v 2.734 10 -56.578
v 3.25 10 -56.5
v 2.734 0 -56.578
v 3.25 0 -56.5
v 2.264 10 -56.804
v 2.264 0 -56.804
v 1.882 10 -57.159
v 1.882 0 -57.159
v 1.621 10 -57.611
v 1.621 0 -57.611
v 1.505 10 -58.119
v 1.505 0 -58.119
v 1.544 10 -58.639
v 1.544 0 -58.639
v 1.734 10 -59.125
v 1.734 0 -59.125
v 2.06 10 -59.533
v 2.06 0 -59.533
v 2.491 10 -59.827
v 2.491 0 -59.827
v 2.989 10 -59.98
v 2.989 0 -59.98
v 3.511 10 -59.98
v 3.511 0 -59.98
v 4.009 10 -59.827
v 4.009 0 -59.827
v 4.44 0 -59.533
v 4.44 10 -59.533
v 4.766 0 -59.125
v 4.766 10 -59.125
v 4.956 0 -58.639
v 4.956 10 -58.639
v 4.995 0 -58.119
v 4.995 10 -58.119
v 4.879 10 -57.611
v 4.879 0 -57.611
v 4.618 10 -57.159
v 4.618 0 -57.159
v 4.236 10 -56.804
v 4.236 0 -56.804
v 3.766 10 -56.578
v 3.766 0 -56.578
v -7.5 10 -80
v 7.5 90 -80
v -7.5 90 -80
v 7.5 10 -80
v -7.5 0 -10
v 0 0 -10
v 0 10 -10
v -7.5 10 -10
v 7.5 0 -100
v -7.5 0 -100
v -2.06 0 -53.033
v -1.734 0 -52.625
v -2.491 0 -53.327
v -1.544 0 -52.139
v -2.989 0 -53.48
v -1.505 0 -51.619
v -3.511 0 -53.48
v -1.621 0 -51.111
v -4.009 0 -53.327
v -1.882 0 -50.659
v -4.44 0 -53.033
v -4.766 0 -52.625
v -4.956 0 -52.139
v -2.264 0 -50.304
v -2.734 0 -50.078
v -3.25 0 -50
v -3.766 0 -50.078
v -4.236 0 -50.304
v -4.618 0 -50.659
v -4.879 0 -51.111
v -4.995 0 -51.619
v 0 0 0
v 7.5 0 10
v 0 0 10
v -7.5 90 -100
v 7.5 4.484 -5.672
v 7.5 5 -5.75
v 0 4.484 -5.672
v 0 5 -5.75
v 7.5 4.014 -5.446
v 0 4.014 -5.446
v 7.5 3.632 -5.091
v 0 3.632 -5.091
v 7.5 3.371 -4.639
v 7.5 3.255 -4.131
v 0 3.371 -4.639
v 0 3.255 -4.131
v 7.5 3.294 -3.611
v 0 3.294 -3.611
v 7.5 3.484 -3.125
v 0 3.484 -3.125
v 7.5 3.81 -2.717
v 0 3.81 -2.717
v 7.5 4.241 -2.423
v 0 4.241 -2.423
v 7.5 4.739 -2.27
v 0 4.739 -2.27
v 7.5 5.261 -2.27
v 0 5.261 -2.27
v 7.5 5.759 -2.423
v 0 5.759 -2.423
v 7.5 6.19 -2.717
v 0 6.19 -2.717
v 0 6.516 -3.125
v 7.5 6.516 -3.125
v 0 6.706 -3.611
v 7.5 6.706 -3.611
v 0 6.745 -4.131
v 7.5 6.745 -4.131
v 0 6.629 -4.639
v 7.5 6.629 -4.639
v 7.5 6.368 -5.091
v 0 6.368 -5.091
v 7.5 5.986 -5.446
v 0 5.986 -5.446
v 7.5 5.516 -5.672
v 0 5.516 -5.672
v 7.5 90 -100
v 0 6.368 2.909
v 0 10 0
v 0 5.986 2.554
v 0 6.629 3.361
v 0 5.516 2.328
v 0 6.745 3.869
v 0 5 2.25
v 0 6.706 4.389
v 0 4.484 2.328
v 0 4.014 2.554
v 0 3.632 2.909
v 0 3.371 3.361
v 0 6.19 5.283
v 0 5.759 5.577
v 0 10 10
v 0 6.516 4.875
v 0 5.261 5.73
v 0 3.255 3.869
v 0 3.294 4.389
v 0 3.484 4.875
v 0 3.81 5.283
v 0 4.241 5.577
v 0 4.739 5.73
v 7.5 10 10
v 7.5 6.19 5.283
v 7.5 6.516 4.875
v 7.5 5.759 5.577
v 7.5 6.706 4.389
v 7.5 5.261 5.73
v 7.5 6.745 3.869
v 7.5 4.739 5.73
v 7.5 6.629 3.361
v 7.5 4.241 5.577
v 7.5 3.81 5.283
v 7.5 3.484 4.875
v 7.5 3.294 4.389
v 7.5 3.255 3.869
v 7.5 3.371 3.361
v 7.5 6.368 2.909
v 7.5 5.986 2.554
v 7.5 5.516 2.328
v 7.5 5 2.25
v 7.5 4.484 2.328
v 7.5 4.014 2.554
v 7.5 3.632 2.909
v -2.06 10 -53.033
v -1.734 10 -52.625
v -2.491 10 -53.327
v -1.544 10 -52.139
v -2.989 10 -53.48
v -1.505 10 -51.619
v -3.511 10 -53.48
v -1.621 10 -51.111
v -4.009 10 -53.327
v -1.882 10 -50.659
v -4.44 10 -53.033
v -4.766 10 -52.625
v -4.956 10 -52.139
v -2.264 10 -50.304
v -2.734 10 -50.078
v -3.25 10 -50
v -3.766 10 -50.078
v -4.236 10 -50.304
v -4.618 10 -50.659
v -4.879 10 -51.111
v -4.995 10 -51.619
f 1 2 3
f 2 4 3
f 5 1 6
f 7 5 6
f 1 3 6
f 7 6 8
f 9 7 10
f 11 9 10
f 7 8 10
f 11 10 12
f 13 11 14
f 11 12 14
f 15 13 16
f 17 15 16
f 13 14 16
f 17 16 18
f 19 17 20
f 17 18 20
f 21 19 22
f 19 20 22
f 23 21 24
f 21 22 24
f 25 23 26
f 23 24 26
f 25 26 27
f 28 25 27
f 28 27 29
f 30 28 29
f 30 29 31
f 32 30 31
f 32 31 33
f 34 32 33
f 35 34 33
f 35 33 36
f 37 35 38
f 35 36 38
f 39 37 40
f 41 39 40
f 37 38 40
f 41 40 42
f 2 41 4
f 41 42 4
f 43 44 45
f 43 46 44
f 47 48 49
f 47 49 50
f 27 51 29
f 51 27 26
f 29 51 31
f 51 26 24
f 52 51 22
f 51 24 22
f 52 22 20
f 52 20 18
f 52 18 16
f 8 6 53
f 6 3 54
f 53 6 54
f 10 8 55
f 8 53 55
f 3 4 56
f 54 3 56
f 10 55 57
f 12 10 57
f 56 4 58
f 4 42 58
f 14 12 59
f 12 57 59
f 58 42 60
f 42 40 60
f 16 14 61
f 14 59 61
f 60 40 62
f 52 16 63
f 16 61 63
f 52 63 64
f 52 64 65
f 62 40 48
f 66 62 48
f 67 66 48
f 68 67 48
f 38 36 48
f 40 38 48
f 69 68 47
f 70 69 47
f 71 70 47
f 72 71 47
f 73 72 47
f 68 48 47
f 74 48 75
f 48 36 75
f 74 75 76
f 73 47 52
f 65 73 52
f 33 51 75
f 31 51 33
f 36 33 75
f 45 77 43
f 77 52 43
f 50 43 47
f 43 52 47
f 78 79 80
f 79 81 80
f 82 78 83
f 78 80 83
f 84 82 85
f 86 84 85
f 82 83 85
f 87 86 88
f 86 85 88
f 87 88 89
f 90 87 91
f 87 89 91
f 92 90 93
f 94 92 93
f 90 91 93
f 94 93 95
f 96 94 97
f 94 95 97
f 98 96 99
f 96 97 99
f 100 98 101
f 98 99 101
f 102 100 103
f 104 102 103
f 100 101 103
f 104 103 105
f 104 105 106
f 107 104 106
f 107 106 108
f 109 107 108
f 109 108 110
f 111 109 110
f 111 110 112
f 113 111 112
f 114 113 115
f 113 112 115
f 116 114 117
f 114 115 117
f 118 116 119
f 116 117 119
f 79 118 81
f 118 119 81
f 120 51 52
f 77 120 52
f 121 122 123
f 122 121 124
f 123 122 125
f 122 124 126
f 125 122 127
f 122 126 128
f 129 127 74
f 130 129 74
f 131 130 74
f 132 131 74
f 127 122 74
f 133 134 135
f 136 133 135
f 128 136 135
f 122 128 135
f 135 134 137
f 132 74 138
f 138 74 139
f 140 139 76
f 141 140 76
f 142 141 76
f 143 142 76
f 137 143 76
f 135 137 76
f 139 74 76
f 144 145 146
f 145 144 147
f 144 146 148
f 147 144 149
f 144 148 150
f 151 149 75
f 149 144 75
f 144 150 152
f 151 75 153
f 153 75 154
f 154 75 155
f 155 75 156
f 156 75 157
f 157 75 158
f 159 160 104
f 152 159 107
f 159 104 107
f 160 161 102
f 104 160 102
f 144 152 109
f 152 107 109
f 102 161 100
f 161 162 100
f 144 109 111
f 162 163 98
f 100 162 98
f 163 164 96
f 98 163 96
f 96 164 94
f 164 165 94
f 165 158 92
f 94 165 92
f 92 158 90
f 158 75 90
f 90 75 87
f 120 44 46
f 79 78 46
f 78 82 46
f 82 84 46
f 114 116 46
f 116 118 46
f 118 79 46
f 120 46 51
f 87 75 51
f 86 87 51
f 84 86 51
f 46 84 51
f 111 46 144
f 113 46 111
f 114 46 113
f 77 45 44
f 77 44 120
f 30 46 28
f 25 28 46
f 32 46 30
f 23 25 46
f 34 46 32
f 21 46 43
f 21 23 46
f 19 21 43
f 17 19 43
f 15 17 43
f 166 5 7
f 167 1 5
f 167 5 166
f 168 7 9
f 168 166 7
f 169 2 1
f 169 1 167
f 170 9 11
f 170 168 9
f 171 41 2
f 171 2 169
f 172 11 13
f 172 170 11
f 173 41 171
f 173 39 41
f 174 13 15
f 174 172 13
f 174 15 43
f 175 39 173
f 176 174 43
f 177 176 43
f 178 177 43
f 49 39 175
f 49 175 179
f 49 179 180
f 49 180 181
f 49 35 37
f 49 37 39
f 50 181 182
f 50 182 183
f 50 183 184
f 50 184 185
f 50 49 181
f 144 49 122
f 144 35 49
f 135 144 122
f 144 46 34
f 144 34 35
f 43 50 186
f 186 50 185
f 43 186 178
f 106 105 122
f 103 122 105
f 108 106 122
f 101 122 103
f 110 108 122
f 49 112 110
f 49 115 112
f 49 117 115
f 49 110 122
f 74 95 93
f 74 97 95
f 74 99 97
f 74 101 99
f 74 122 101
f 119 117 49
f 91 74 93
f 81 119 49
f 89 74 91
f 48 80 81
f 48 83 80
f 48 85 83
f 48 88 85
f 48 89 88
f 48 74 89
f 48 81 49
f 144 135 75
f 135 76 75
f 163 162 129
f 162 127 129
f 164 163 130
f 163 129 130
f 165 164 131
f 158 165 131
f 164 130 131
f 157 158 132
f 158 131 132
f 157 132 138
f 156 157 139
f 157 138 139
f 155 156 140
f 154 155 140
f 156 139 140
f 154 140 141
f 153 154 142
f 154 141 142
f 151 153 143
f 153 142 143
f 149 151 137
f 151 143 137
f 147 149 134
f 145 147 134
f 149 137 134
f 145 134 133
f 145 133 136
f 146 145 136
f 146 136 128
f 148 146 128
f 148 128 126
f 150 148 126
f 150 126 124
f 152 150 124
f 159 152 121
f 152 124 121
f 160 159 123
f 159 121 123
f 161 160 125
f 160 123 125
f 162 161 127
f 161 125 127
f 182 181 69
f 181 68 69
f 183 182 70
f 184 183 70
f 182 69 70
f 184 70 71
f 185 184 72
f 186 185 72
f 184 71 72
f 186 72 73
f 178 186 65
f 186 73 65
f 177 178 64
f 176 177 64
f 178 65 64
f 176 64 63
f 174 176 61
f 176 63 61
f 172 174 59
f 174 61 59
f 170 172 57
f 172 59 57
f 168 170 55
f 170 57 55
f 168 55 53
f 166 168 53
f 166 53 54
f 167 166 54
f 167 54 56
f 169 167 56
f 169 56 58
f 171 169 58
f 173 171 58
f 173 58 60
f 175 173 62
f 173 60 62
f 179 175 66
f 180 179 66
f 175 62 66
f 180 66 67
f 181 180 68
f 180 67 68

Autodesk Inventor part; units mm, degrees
ref_plane "YZ Plane" through (0, 0, 0) normal (1, 0, 0) x (0, 1, 0)
ref_plane "XZ Plane" through (0, 0, 0) normal (0, 1, 0) x (-1, 0, 0)
ref_plane "XY Plane" through (0, 0, 0) normal (0, 0, 1) x (1, 0, 0)
sketch "Boceto2" plane through (0, 0, 0) normal (0, 1, 0) x (-1, 0, 0)
  line L0 (7.5, 100) -> (-7.5, 100)
  line L1 (-7.5, 100) -> (-7.5, -100)
  line L2 (-7.5, -100) -> (7.5, -100)
  line L3 (7.5, -100) -> (7.5, 100)
  line L4 (7.5, 100) -> (-7.5, -100) construction
  line L5 (-7.5, 100) -> (7.5, -100) construction
  point P0 (0, 0)
  dimension "d7" = 15
  dimension "d8" = 200
extrude "Extrusión1" add sketch "Boceto2" along normal blind 10
sketch "Boceto3" plane through (0, 10, 0) normal (0, 1, 0) x (1, 0, 0)
  circle A0 centre (3.25, 58.25) radius 1.75
  line L0 (5, 50) -> (-5, 50)
  line L1 (-5, 50) -> (-5, 60)
  line L2 (-5, 60) -> (5, 60)
  line L3 (5, 60) -> (5, 50)
  line L4 (5, 50) -> (-5, 60) construction
  line L5 (-5, 50) -> (5, 60) construction
  circle A1 centre (-3.25, 51.75) radius 1.75
  line L6 (7.5, 100) -> (-7.5, 100) projected
  line L7 (-7.5, 0) -> (3.408, 0)
  line L8 (5, -60) -> (5, -50)
  line L9 (-5, -60) -> (5, -60)
  line L10 (5, -50) -> (-5, -50)
  line L11 (-5, -50) -> (-5, -60)
  line L12 (-5, -50) -> (5, -60) construction
  circle A2 centre (-3.25, -51.75) radius 1.75
  line L13 (5, -50) -> (-5, -60) construction
  circle A3 centre (3.25, -58.25) radius 1.75
  line L14 (-7.5, -100) -> (7.5, -100) projected
  point P0 (0, 0)
  point P1 (-5, 55)
  point P2 (0, 100)
  point P3 (-5, -55)
  dimension "d11" = 3.5
  dimension "d12" = 1.75
  dimension "d13" = 1.75
  dimension "d14" = 1.75
  dimension "d15" = 1.75
  dimension "d16" = 10
  dimension "d17" = 10
  dimension "d19" = 40
  dimension "d81" = 40
hole "Agujero1" at (3.25, 10, 58.25) at (-3.25, 10, 51.75) at (3.25, 10, -58.25) at (-3.25, 10, -51.75) direction (0, -1, 0) diameter 3.5 end through all
sketch "Boceto4" plane through (0, 10, 0) normal (0, 1, 0) x (1, 0, 0)
  line L0 (-7.5, 100) -> (-7.5, -100) projected
  line L1 (-7.5, -100) -> (7.5, -100)
  line L2 (7.5, -100) -> (7.5, -80)
  line L3 (7.5, -80) -> (-7.5, -80)
  line L4 (-7.5, -80) -> (-7.5, -100)
  line L5 (-7.5, 0) -> (1.0116, 0)
  line L6 (-7.5, -100) -> (-7.5, 100)
  line L7 (-7.5, 100) -> (7.5, 100)
  line L8 (7.5, 100) -> (7.5, 80)
  line L9 (7.5, 80) -> (-7.5, 80)
  line L10 (-7.5, 80) -> (-7.5, 100)
  point P0 (0, 0)
  point P1 (-7.5, -80)
  point P2 (-7.5, 80)
  dimension "d27" = 15
  dimension "d28" = 20
extrude "Extrusión2" add sketch "Boceto4" along normal blind 80
sketch "Boceto5" plane through (0, 90, 0) normal (0, 1, 0) x (1, 0, 0)
  line L0 (-7.5, -100) -> (7.5, -100) projected
  line L1 (-7.5, -100) -> (49.5, -100)
  line L2 (49.5, -100) -> (49.5, 100)
  line L3 (49.5, 100) -> (-7.5, 100)
  line L4 (-7.5, 100) -> (-7.5, -100)
  line L5 (49.5, -100) -> (-150.5, -100)
  line L6 (-150.5, -100) -> (-150.5, 100)
  line L7 (-150.5, 100) -> (49.5, 100)
  line L8 (49.5, 100) -> (49.5, -100)
  point P0 (0, 0)
  point P1 (-7.5, 100)
  dimension "d31" = 57
  dimension "d32" = 200
  dimension "d75" = 200
extrude "Extrusión3" add sketch "Boceto5" along normal blind 110
sketch "Boceto6" plane through (0, 200, 0) normal (0, 1, 0) x (1, 0, 0)
  line L0 (49.5, 100) -> (7.5, 100) projected
  line L1 (49.5, 100) -> (29.5, 100)
  line L2 (29.5, 100) -> (29.5, 80)
  line L3 (7.5, -100) -> (49.5, -100) projected
  line L4 (28.5, -100) -> (28.5, -80)
  line L5 (-150.5, 100) -> (-150.5, -100) projected
  line L6 (29.5, 80) -> (-150.5, 80)
  line L7 (-150.5, 80) -> (-150.5, -80)
  line L8 (-150.5, -80) -> (29.5, -80)
  line L9 (29.5, -80) -> (29.5, 80)
  line L10 (-150.5, -100) -> (49.5, -100) projected
  point P0 (7.5, 80)
  point P1 (-50.5, -100)
  dimension "d36" = 20
  dimension "d37" = 20
  dimension "d38" = 20
  dimension "d77" = 20
extrude "Extrusión4" cut sketch "Boceto6" against normal blind 90 contours L8 L5 L6 L9
sketch "Boceto7" plane through (-150.5, 90, -100) normal (-1, 0, 0) x (0, 0, 1)
  line L0 (0, 110) -> (20, 110) projected
  line L1 (20, 110) -> (10, 110)
  line L2 (10, 110) -> (10, 20)
  line L3 (10, 20) -> (20, 20)
  line L4 (20, 20) -> (20, 110)
  line L5 (180, 110) -> (180, 20) projected
  line L6 (180, 110) -> (190, 110)
  line L7 (190, 110) -> (190, 20)
  line L8 (190, 20) -> (180, 20)
  line L9 (180, 20) -> (180, 110)
  line L10 (200, 0) -> (200, 110) projected
  line L11 (0, 0) -> (0, 110) projected
  line L12 (0, 110) -> (10, 110)
  line L13 (10, 110) -> (10, 20)
  line L14 (10, 20) -> (0, 20)
  line L15 (0, 20) -> (0, 110)
  line L16 (200, 110) -> (0, 110) projected
  line L17 (200, 110) -> (190, 110)
  line L18 (190, 110) -> (190, 20)
  line L19 (190, 20) -> (200, 20)
  line L20 (200, 20) -> (200, 110)
  point P0 (100, -90)
  dimension "d63" = 10
  dimension "d65" = 10
  dimension "d76" = 10
extrude "Extrusión5" cut sketch "Boceto7" against normal blind 30 contours L0 L4 L3 L2 | L6 L7 L8 L5
sketch "Boceto8" plane through (-7.5, 0, 100) normal (0, 0, 1) x (1, 0, 0)
  line L0 (-113, 110) -> (-113, 200) projected
  line L1 (-113, 200) -> (-113, 110)
  circle A0 centre (-124.75, 183.25) radius 1.75
  line L2 (-123, 175) -> (-133, 175)
  line L3 (-133, 175) -> (-133, 185)
  line L4 (-133, 185) -> (-123, 185)
  line L5 (-123, 185) -> (-123, 175)
  line L6 (-123, 175) -> (-133, 185) construction
  line L7 (-133, 175) -> (-123, 185) construction
  circle A1 centre (-131.25, 176.75) radius 1.75
  line L8 (-143, 200) -> (57, 200) projected
  line L9 (-143, 90) -> (-143, 200) projected
  line L10 (-113, 155) -> (-128, 155)
  line L11 (-123, 125) -> (-123, 135)
  line L12 (-133, 125) -> (-123, 125)
  line L13 (-123, 135) -> (-133, 125) construction
  line L14 (-123, 135) -> (-133, 135)
  line L15 (-133, 135) -> (-123, 125) construction
  circle A2 centre (-131.25, 133.25) radius 1.75
  line L16 (-133, 135) -> (-133, 125)
  circle A3 centre (-124.75, 126.75) radius 1.75
  line L17 (-143, 110) -> (-113, 110) projected
  point P0 (7.5, 0)
  point P1 (-133, 180)
  point P2 (-123, 180)
  point P3 (-133, 130)
  point P4 (-123, 130)
  dimension "d45" = 3.5
  dimension "d46" = 1.75
  dimension "d47" = 1.75
  dimension "d48" = 1.75
  dimension "d49" = 1.75
  dimension "d50" = 10
  dimension "d51" = 10
  dimension "d52" = 15
  dimension "d53" = 10
  dimension "d54" = 10
  dimension "d55" = 15
hole "Agujero2" at (-132.25, 183.25, 100) at (-138.75, 176.75, 100) at (-138.75, 133.25, 100) at (-132.25, 126.75, 100) direction (0, 0, -1) diameter 3.5 end through all
ref_plane "Plano de trabajo1" through (-150.5, 90, 100) normal (0, -1, 0) x (1, 0, 0)
split "Dividir1" plane through (-150.5, 90, 100) removes the side toward (0, 1, 0)
ref_plane "Plano de trabajo2" through (-7.5, 10, 0) normal (0, 0, 1) x (1, 0, 0)
sketch "Boceto9" plane through (7.5, 0, 100) normal (1, 0, 0) x (0, 0, -1)
  circle A0 centre (96, 5) radius 1.75
  circle A1 centre (104, 5) radius 1.75
  point P0 (100, 0)
  point P1 (100, 0)
  dimension "d89" = 3.5
hole "Agujero3" at (7.5, 5, 4) at (7.5, 5, -4) direction (-1, 0, 0) diameter 3.5 end through all
sketch "Boceto10" plane through (0, 10, 0) normal (0, 1, 0) x (1, 0, 0)
  line L0 (0, 0) -> (0, -10)
  line L1 (0, -10) -> (7.5, -10)
  line L2 (7.5, -80) -> (7.5, 80) projected
  line L3 (0, 0) -> (0, 10)
  line L4 (0, 10) -> (-7.5, 10)
  line L5 (-7.5, 80) -> (-7.5, -80) projected
  dimension "d97" = 10
  dimension "d98" = 10
split body "Dividir2" sketch "Boceto10" result one side removed curves L1 L0 L3 L4 removed pieces at (-7, 33.3333, 93.3333)
properties part number "container_front_foot_2"
